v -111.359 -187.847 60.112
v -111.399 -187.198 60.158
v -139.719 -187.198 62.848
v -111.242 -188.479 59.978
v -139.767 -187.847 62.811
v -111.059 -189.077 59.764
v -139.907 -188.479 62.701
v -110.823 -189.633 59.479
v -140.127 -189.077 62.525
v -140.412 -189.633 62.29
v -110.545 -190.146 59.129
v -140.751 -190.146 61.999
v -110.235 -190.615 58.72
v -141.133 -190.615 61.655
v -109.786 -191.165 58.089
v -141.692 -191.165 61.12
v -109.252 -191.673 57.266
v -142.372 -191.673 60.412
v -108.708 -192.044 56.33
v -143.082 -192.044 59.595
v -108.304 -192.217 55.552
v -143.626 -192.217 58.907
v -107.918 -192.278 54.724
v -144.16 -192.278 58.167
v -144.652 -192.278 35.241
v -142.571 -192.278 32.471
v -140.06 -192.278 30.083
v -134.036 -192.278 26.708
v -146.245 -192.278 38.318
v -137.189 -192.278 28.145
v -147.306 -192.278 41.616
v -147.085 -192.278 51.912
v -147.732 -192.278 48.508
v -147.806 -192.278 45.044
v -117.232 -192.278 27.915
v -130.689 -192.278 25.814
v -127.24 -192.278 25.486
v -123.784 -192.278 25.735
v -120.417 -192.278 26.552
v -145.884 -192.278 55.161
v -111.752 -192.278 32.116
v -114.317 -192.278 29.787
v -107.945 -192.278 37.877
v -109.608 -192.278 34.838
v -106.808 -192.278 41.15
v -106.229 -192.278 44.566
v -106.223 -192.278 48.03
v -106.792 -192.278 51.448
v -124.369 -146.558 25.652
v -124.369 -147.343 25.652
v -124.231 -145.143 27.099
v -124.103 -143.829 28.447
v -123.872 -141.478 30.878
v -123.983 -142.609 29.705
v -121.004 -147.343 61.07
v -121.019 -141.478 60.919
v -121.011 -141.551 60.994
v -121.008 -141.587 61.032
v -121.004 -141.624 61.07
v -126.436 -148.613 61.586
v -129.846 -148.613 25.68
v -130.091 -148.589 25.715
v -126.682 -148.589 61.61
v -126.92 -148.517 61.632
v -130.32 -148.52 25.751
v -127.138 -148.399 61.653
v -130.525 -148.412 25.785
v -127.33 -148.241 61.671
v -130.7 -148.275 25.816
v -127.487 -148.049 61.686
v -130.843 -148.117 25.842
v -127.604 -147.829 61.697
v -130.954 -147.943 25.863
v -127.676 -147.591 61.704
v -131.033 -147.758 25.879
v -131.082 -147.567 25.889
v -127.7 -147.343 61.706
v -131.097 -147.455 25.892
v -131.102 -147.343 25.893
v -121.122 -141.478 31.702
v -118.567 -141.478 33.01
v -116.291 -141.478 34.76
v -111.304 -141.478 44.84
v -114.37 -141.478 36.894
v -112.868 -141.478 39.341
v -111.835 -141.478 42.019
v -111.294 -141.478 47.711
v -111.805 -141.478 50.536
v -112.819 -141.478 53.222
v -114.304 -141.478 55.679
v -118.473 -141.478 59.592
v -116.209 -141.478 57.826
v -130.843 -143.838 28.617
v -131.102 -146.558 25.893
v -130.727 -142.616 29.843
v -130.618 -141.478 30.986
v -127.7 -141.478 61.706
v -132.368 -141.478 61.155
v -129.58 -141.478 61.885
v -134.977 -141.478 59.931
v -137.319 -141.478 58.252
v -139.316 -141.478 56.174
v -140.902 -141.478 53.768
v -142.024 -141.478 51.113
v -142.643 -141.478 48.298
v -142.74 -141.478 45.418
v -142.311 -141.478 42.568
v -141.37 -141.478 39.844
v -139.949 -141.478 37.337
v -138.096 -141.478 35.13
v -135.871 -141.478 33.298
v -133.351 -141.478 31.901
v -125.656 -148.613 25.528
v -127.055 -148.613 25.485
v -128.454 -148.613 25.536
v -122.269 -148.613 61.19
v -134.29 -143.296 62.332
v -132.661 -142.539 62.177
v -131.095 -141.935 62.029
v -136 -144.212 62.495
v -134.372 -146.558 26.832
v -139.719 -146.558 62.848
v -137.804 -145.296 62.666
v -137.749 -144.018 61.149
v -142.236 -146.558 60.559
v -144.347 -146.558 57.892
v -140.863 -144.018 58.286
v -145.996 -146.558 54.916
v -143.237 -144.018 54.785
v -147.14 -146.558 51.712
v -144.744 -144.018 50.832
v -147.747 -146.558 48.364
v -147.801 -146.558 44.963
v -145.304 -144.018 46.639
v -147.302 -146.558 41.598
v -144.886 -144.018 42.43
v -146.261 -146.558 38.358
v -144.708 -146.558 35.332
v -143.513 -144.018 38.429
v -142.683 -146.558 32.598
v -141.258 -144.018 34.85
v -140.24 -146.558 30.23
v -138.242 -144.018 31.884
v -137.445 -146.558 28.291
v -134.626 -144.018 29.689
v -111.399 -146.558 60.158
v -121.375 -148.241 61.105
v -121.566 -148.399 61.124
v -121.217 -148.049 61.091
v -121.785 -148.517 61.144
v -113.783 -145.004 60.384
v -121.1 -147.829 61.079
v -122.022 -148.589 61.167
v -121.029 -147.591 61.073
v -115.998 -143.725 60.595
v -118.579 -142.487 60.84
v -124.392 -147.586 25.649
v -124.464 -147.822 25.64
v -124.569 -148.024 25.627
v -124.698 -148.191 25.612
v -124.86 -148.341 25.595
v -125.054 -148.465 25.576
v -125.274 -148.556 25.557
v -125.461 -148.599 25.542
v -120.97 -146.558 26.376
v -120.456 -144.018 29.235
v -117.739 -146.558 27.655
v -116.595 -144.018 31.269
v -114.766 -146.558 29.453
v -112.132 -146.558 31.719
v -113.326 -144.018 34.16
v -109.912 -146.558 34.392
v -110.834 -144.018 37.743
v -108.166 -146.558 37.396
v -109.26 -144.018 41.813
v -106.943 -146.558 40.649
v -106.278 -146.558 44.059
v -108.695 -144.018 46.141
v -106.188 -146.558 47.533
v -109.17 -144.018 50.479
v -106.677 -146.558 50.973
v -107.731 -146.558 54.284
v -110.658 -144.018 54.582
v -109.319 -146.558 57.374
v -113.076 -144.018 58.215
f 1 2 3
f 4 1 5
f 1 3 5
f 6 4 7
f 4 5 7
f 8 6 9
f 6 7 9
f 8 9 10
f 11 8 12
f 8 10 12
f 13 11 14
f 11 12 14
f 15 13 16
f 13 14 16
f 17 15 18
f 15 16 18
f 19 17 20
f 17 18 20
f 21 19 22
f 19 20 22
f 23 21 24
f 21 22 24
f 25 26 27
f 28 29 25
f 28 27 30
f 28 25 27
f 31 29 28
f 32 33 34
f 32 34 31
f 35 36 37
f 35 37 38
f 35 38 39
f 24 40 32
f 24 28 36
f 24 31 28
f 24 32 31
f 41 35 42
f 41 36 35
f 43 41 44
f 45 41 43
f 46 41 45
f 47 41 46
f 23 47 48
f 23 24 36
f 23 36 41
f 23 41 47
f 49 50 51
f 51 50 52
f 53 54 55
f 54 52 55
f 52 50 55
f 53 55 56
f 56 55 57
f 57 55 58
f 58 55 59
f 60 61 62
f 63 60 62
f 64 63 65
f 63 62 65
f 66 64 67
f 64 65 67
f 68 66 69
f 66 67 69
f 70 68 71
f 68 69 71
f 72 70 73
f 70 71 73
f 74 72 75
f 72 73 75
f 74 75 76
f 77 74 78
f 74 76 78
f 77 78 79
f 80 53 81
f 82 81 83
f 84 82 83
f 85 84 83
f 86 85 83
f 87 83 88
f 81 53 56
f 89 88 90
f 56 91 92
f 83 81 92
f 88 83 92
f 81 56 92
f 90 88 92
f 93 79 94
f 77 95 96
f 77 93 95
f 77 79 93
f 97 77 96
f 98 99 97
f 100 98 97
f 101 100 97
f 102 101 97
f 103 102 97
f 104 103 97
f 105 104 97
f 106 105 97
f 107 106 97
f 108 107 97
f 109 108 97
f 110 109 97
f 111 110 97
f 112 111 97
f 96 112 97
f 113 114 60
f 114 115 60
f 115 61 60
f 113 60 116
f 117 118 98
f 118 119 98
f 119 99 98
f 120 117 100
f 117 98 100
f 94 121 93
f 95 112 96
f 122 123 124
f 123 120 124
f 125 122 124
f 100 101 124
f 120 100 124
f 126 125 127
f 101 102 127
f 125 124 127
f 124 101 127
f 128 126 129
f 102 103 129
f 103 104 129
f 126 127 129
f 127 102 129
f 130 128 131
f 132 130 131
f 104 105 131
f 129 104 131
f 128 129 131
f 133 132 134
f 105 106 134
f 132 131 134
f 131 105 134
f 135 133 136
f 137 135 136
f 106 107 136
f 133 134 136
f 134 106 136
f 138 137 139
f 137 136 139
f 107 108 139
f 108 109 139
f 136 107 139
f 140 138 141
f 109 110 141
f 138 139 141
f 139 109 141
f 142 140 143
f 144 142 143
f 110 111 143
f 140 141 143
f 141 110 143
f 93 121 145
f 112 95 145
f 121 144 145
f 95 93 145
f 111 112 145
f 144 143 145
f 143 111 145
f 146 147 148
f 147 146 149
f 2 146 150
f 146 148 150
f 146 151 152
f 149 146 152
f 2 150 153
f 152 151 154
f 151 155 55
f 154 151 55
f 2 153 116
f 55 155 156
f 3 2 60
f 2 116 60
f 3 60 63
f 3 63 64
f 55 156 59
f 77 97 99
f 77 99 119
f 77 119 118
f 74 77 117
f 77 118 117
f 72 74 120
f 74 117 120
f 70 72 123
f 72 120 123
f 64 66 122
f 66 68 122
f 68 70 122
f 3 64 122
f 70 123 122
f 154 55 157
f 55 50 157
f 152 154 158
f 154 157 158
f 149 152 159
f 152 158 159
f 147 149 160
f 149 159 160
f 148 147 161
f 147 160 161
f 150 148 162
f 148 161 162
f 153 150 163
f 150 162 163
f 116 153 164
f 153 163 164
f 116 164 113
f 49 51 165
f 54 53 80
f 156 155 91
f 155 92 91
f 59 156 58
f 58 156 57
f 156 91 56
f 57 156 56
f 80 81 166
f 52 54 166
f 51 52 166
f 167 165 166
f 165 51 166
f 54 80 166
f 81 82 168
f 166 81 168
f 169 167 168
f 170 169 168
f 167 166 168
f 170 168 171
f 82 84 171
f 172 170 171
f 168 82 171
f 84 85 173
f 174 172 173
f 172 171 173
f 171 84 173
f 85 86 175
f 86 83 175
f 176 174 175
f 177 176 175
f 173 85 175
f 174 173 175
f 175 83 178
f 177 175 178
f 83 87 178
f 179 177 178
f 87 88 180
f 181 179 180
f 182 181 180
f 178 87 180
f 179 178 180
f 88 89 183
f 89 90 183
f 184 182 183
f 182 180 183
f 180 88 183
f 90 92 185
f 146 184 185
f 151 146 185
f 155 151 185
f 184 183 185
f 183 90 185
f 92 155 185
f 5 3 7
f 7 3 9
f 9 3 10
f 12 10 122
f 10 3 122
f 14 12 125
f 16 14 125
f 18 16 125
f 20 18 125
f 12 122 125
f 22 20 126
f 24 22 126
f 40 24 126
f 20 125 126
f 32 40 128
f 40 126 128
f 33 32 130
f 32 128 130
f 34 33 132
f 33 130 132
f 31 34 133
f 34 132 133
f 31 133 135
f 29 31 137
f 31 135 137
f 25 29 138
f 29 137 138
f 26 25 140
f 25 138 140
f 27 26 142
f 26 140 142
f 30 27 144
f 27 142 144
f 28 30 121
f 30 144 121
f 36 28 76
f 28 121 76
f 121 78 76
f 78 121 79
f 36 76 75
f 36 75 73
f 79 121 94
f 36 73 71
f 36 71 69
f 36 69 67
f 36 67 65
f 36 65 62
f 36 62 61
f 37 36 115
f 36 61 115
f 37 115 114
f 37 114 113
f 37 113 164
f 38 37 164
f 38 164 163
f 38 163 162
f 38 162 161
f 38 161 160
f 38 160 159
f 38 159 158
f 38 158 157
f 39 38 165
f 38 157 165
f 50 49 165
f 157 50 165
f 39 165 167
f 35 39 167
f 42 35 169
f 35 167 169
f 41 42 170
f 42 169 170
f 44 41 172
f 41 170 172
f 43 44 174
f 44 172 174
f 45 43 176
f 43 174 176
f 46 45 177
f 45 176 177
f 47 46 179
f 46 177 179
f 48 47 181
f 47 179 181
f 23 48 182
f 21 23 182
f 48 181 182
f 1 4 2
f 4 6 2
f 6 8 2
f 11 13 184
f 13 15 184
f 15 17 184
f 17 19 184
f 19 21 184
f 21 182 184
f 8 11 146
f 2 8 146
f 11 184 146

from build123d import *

# Parameters (mm, degrees)
F3_DEPTH = 50.8
F4_R     = 5.08
F5_SIZE  = 5.08
F7_W     = 6.725892
F7_H     = 7.135436
F8_DEPTH = 50.8
F9_R     = 1.27


with BuildPart() as f3:
    # F2 (on offset) → F3 (new body)
    with BuildSketch(Plane.XZ.offset(141.478)):
        with BuildLine():
            Line((-111.399229, 60.157929), (-139.718567, 62.847873))
            ThreePointArc((-139.718567, 62.847873), (-128.971224, 25.57843), (-111.399229, 60.157929))
        make_face()
    extrude(amount=F3_DEPTH)

    # F4
    f4_edges = [f3.edges().sort_by_distance(p)[0] for p in [
        (-125.558898, -192.278, 61.502901),
    ]]
    fillet(f4_edges, radius=F4_R)

    # F5
    f5_edges = [f3.edges().sort_by_distance(p)[0] for p in [
        (-128.971224, -141.478, 25.57843),
    ]]
    chamfer(f5_edges, length=F5_SIZE)

    # F7 (on face) → F8 (cut)
    with BuildSketch(Plane(origin=(4.666977, 0, 49.133249), x_dir=(0.995519, 0, -0.094561), z_dir=(0.094561, 0, 0.995519))):
        with Locations((-129.599802, -145.045718)):
            Rectangle(F7_W, F7_H)
    extrude(amount=-F8_DEPTH, mode=Mode.SUBTRACT)

    # F9
    f9_edges = [f3.edges().sort_by_distance(p)[0] for p in [
        (-129.400884, -148.613436, 43.799411),
        (-122.686359, -148.613436, 43.361026),
    ]]
    fillet(f9_edges, radius=F9_R)


solid = f3.part
